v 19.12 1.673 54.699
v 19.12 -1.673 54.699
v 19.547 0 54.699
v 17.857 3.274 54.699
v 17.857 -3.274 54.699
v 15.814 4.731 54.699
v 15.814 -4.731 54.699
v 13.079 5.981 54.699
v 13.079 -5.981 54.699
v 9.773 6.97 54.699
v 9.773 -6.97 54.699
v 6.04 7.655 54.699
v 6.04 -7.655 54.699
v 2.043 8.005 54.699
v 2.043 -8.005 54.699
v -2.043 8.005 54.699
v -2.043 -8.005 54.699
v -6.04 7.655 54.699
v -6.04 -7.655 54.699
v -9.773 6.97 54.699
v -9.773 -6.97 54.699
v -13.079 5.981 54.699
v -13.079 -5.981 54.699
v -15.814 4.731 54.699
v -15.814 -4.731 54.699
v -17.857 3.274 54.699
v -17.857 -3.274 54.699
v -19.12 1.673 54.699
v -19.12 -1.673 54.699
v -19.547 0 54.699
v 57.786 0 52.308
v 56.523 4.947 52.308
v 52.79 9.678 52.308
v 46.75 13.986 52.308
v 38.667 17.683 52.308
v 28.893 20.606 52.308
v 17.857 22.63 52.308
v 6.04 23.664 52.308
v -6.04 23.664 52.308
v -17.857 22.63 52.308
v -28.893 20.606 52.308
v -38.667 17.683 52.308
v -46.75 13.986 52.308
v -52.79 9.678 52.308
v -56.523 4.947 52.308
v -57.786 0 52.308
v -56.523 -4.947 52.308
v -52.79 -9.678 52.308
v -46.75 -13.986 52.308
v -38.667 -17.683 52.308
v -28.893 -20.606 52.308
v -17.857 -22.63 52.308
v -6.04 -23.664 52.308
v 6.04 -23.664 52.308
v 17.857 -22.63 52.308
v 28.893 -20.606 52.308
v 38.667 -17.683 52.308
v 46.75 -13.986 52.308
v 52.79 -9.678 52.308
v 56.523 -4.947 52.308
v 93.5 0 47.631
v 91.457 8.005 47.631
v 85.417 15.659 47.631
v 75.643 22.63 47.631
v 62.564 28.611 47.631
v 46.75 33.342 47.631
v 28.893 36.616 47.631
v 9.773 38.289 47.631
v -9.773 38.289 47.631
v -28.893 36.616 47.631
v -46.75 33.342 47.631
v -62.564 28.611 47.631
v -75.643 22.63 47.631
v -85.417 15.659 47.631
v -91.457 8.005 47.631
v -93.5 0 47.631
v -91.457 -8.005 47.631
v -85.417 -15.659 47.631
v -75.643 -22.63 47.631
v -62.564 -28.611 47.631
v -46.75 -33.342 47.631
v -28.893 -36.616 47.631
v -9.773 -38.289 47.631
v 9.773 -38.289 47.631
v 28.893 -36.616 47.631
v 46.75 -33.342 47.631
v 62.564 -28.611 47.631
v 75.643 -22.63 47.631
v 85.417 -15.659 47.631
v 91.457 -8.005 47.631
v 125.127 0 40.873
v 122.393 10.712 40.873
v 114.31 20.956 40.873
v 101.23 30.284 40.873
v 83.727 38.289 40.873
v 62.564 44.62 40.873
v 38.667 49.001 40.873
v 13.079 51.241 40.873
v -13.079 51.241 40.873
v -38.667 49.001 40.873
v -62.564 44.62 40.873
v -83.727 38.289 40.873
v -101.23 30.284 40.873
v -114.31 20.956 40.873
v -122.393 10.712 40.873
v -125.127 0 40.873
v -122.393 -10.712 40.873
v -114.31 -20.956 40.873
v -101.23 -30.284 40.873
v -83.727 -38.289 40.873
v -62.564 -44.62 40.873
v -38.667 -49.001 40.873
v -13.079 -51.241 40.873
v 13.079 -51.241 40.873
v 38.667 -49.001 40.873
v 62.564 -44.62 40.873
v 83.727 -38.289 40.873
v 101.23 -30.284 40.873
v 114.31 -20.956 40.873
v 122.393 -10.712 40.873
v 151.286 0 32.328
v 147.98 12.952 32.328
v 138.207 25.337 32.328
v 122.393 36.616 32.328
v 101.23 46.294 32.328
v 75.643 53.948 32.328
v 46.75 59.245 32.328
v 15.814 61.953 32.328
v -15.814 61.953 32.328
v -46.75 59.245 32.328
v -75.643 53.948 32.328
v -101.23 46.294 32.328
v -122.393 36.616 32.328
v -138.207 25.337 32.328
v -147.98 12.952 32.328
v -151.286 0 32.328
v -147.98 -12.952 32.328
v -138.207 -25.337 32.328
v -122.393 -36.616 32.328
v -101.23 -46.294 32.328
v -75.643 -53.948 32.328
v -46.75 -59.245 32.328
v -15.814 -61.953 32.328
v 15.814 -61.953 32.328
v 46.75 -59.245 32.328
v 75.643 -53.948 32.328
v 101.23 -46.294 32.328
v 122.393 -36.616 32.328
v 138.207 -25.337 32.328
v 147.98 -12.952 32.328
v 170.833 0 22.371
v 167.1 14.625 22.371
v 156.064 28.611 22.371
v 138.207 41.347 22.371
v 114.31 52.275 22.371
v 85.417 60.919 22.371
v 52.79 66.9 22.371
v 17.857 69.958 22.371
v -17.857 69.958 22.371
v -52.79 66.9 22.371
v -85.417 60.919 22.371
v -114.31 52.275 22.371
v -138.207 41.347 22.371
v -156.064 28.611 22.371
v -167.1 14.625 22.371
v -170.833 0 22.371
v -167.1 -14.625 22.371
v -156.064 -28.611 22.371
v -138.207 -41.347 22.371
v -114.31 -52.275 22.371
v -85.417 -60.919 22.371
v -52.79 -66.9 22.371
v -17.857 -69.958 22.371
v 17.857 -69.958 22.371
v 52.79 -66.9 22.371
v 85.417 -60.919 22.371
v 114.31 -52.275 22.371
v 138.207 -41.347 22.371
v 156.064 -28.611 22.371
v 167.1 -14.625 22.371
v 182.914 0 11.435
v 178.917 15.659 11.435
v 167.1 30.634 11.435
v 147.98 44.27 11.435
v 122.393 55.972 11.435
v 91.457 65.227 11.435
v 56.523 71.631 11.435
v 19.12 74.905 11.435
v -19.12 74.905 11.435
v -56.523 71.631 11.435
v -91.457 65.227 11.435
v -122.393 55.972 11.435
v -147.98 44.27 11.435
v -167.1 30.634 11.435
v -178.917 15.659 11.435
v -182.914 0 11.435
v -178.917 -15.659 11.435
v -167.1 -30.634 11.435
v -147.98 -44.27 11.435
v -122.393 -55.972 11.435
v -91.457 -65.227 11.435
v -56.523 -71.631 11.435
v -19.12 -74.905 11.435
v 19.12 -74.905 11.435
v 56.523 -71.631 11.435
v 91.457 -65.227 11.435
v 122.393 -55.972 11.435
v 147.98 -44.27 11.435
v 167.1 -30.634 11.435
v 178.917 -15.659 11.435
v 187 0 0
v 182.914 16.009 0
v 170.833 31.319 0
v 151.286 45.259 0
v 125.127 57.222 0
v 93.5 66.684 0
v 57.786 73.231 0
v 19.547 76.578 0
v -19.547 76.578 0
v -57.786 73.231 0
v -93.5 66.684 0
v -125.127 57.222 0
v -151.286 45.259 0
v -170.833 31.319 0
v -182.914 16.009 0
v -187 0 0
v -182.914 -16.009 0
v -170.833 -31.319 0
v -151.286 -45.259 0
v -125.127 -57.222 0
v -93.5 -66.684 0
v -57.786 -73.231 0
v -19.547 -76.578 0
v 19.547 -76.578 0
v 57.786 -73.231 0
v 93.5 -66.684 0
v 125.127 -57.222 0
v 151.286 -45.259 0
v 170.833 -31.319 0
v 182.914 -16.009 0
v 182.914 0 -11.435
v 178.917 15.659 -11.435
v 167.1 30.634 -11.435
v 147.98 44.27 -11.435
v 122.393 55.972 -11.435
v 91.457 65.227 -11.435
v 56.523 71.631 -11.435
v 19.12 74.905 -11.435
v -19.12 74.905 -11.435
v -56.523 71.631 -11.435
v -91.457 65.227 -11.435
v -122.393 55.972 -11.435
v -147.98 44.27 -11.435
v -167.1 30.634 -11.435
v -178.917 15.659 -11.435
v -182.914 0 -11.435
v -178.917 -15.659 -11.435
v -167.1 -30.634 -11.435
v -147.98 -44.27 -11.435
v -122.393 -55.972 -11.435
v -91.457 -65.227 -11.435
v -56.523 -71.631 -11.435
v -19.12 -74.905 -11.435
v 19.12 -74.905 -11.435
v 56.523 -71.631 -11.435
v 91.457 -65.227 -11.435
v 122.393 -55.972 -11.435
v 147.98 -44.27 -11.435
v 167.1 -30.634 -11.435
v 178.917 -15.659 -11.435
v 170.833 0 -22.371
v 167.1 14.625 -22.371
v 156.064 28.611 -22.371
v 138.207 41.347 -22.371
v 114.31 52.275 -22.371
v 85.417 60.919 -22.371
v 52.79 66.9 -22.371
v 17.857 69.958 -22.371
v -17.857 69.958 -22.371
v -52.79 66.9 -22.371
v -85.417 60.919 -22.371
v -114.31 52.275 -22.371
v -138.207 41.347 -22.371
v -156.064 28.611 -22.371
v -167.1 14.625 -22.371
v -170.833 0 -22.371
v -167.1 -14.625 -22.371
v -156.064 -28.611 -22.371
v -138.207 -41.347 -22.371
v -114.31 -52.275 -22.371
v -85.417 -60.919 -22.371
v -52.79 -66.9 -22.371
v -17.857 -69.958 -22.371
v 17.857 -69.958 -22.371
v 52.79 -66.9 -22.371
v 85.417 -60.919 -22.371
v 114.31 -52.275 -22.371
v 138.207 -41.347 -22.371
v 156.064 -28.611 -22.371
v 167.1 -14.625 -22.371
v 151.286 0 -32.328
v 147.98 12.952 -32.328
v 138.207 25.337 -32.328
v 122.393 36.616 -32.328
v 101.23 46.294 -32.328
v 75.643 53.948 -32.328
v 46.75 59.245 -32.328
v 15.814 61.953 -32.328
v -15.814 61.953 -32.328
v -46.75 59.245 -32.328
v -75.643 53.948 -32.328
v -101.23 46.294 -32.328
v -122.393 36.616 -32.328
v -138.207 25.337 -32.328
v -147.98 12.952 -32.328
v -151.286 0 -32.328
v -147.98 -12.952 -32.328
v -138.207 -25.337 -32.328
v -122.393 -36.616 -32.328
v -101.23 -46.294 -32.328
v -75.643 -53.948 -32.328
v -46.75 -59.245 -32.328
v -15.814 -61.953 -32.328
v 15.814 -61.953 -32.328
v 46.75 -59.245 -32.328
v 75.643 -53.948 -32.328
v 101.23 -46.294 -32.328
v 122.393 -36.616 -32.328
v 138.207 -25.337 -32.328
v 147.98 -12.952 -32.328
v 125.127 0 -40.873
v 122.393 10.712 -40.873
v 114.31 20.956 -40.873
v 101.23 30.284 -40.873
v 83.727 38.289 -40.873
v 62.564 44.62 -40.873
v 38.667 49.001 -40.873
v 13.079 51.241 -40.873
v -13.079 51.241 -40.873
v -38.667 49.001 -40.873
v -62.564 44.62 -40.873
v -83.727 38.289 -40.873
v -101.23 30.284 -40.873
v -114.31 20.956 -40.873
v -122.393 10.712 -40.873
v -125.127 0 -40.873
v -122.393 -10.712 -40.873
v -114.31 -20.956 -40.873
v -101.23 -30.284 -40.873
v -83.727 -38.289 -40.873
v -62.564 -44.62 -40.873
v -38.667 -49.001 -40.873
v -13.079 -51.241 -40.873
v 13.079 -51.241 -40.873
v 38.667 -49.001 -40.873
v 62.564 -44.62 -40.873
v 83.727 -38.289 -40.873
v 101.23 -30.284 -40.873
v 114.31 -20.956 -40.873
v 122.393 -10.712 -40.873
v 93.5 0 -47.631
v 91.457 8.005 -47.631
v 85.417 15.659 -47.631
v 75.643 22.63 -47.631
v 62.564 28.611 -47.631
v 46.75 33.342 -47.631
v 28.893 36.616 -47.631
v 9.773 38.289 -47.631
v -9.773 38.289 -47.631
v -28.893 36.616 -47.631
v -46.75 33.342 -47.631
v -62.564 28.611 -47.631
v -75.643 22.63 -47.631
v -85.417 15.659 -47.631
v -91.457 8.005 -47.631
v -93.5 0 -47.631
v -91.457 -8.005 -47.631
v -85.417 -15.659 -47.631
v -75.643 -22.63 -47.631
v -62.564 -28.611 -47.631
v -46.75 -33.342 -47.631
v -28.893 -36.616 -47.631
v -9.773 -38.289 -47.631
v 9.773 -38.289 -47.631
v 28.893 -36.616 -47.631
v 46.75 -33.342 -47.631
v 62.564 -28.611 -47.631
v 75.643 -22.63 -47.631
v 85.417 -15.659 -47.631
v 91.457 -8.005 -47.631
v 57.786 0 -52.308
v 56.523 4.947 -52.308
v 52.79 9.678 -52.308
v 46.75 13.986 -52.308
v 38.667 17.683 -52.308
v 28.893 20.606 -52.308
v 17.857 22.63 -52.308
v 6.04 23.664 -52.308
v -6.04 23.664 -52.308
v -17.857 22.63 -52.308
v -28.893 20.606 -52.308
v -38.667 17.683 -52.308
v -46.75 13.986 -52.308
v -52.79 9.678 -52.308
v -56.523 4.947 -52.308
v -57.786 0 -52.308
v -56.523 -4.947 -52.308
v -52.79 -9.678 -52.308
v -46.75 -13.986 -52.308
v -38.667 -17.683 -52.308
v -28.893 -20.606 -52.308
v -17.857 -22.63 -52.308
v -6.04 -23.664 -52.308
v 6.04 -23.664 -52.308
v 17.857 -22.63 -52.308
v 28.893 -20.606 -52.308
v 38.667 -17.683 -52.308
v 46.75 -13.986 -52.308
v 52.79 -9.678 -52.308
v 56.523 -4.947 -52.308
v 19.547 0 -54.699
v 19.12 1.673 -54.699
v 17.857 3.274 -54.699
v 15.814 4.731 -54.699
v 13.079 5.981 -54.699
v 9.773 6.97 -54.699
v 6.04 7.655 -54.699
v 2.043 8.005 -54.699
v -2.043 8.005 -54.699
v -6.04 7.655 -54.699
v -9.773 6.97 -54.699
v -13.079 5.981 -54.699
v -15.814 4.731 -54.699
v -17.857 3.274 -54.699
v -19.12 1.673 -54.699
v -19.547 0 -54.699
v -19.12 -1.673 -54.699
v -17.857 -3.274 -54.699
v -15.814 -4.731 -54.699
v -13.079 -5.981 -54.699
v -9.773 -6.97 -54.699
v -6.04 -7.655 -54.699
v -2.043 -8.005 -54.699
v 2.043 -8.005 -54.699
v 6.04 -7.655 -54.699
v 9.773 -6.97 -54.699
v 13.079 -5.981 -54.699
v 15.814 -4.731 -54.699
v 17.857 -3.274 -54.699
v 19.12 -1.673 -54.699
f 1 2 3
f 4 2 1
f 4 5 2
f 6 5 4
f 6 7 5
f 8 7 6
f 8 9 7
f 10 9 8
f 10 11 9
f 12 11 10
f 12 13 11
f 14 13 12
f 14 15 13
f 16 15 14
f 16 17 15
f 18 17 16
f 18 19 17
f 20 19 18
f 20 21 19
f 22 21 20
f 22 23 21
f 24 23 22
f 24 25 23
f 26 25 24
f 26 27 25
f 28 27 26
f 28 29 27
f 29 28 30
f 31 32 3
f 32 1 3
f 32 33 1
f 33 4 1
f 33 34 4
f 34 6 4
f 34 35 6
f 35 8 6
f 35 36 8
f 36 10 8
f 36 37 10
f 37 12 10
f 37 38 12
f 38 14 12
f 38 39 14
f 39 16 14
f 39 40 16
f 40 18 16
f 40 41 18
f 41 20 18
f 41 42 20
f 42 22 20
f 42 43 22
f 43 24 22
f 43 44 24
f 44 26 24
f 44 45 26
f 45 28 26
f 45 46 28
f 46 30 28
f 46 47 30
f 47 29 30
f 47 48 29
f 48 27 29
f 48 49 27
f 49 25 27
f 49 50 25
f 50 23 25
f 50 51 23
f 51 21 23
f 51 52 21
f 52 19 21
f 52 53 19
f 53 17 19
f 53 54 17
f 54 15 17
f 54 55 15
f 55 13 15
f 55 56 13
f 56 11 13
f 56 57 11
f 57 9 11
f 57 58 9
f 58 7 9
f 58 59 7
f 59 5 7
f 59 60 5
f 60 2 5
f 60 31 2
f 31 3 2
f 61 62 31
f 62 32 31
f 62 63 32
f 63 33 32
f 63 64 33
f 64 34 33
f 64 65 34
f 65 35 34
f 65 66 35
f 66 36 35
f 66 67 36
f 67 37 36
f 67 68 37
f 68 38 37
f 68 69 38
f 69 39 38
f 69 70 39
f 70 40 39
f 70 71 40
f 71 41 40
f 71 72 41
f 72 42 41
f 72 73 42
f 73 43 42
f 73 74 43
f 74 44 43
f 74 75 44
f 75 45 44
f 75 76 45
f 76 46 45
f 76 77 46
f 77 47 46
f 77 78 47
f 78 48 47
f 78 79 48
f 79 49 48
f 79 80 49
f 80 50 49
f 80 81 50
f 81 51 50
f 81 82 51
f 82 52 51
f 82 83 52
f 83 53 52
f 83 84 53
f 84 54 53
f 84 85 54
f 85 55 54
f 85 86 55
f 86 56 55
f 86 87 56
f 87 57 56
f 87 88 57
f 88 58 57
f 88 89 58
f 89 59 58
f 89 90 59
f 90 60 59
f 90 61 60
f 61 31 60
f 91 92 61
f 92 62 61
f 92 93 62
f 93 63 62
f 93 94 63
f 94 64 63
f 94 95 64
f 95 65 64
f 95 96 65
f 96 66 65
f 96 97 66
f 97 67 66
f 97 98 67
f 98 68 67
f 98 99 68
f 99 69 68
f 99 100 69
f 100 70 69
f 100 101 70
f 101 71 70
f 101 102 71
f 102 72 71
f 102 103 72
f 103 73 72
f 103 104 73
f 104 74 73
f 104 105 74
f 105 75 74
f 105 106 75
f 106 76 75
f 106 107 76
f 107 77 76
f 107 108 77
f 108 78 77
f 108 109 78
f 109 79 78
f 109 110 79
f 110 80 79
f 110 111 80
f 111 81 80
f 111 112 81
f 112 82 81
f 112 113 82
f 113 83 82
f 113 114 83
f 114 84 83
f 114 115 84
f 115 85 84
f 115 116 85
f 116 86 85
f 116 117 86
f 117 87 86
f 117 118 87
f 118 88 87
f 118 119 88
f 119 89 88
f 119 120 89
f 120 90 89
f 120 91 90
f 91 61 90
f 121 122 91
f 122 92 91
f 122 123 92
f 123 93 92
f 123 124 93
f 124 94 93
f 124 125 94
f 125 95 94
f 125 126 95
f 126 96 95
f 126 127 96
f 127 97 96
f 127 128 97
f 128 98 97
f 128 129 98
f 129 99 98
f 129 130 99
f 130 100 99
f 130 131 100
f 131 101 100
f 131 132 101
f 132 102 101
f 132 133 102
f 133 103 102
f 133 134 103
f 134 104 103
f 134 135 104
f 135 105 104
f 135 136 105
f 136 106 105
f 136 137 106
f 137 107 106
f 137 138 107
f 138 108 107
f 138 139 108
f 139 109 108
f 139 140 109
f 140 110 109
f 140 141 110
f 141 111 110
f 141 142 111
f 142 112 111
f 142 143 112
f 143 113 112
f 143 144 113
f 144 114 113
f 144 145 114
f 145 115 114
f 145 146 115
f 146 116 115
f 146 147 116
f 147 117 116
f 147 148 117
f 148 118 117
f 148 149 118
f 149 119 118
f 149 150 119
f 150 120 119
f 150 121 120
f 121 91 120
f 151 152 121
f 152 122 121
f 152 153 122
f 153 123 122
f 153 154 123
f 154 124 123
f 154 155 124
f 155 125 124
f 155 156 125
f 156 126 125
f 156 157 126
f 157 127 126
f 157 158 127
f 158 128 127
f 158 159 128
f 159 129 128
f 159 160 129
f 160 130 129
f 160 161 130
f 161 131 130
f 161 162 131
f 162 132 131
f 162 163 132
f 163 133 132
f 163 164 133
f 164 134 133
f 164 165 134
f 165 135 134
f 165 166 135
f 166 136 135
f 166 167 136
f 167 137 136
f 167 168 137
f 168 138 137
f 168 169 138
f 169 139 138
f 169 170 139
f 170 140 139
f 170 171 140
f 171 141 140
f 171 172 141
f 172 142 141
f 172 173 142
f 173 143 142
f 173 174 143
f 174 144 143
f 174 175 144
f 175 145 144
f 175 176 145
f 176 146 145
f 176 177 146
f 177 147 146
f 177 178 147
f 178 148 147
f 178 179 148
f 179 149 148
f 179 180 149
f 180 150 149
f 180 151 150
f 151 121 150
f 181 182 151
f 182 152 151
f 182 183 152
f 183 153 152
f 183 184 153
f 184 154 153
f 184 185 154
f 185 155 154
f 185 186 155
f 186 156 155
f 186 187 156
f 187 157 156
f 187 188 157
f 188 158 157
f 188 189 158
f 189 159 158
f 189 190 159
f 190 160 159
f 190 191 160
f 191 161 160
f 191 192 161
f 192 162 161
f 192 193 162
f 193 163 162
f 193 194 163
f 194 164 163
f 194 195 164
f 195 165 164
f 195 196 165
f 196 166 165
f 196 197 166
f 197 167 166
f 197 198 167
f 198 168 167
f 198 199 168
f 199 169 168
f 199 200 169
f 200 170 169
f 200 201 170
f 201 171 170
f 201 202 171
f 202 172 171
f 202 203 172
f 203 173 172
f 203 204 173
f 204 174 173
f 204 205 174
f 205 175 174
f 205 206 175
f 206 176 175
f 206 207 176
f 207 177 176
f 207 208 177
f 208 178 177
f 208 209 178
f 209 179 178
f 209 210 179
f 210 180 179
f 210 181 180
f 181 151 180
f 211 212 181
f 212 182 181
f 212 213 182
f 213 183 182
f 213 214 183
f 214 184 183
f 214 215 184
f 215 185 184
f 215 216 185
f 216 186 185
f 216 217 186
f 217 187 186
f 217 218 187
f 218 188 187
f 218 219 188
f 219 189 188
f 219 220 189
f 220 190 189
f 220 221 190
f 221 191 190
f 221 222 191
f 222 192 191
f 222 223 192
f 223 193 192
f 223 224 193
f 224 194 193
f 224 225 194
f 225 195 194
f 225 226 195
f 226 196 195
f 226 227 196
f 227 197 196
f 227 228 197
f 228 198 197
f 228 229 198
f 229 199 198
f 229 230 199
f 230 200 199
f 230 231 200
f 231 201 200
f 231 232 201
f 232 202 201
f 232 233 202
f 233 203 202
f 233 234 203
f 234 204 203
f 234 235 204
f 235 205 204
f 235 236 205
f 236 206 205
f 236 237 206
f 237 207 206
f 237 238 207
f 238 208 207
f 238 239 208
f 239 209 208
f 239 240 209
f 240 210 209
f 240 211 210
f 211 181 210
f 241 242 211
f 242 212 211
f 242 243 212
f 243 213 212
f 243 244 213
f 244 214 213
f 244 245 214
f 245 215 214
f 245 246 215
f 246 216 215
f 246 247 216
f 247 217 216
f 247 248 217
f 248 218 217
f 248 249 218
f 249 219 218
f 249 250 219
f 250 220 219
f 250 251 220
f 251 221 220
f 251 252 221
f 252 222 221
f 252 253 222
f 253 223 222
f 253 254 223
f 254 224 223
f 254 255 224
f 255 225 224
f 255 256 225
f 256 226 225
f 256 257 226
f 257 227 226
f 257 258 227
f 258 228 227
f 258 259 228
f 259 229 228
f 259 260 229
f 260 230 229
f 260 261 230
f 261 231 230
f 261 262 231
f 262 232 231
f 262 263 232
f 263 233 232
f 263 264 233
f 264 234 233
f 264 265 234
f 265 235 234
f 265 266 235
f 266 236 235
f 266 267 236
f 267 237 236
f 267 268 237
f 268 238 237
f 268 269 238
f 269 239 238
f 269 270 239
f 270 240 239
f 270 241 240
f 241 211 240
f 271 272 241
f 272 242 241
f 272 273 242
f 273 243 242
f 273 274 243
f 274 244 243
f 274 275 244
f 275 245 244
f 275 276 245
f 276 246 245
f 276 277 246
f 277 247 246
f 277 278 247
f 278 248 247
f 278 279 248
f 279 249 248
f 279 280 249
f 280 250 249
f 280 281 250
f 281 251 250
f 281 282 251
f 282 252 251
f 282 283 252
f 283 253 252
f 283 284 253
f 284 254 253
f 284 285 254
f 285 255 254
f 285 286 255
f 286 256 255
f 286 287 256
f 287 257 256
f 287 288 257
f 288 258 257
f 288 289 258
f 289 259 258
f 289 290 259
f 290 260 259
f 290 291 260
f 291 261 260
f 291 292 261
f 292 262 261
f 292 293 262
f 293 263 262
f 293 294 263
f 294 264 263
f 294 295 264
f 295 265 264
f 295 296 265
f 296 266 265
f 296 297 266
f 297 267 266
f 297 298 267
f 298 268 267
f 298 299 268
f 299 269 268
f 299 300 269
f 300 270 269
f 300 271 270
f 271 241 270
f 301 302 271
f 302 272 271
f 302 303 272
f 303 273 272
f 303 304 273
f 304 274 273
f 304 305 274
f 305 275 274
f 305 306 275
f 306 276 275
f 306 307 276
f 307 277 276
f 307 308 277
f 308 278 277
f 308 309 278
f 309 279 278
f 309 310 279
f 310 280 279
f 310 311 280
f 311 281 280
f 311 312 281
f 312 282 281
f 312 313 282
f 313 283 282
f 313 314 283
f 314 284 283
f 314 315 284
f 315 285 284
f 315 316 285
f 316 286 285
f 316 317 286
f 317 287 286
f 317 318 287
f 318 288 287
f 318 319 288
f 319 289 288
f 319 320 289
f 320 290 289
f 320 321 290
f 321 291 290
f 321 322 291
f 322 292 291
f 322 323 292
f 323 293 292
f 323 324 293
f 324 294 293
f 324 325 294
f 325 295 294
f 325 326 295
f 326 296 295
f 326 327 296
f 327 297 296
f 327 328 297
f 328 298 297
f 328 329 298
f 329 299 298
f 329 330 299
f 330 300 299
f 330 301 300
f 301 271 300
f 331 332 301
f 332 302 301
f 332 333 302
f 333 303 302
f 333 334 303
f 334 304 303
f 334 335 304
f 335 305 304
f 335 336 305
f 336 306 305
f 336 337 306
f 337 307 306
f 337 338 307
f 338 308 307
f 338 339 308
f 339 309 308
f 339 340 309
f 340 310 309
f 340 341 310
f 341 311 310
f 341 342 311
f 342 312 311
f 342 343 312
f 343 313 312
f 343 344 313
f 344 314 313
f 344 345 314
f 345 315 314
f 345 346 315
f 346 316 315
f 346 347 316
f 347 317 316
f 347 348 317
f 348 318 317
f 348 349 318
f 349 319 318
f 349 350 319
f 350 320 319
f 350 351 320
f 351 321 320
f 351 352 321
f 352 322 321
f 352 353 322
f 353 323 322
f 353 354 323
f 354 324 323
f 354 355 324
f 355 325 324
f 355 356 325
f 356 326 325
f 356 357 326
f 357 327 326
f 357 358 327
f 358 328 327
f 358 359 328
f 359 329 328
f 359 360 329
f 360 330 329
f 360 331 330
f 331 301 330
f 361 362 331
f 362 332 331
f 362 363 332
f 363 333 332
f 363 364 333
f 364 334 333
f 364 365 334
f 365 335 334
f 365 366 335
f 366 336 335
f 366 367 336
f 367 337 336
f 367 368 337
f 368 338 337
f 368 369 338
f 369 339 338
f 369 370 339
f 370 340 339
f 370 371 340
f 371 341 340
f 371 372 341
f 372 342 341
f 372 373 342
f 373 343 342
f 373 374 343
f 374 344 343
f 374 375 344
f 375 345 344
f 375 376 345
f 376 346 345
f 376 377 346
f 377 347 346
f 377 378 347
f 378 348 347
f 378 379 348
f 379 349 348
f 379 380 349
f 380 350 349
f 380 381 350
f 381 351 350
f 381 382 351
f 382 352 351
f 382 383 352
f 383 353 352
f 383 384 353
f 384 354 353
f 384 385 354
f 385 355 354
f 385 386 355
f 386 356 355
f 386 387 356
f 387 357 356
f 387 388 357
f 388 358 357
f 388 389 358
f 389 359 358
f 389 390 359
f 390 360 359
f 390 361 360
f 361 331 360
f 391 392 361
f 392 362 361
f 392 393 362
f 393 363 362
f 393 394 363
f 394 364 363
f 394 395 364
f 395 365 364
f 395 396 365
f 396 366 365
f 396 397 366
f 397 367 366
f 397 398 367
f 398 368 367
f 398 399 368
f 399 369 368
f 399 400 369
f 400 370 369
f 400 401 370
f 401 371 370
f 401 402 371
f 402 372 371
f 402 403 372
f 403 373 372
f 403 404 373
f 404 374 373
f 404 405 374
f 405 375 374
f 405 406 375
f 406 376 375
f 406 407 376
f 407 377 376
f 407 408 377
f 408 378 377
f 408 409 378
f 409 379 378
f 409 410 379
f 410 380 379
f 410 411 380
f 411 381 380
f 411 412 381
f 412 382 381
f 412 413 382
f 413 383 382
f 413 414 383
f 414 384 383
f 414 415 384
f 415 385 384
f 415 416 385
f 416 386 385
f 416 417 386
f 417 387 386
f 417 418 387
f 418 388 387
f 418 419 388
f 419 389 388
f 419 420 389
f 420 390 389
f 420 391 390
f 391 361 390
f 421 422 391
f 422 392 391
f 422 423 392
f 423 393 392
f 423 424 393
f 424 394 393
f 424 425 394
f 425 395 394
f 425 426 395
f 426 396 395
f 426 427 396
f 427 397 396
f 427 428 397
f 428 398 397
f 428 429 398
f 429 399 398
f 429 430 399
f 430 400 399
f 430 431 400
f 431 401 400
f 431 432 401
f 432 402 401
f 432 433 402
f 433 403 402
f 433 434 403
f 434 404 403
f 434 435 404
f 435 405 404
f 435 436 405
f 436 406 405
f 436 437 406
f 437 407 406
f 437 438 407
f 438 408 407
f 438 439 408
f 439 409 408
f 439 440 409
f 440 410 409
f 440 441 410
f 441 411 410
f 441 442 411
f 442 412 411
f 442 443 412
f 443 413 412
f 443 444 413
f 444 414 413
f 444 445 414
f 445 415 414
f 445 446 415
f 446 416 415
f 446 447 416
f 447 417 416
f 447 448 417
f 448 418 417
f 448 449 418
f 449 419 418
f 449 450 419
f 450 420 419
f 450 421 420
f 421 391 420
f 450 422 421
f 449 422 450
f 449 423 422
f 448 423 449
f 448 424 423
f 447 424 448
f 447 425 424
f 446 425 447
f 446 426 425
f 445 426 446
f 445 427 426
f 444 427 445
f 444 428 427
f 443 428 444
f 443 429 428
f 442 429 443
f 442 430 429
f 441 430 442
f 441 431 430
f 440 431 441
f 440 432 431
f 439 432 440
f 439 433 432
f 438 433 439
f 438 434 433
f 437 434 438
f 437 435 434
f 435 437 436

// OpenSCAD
// Generated by SolidPython 1.0.1 on 2020-07-29 00:46:52


scale(v = [17, 7, 5]) {
	sphere(r = 11);
}
/***********************************************
*********      SolidPython code:      **********
************************************************
 
# import packages: SolidPython
from solid import *
from solid.utils import *
from itertools import chain, combinations, permutations


class Resize:

    def __init__(self, scad_file):
        self.scad_file = scad_file
        #self.scad_file = import_scad(scad_file)
        # cone/cylinder param:
        self.r1 = 0
        self.r2 = 0
        self.h = 0
        # rectangular prism param:
        self.w = 0
        self.l = 0
        # ellipse param:
        self.r = 0

    # import OpenScad code (file name corresponds to shape)


    # classify shape + parameters
    def assign(self, param1, param2, param3):
        if self.scad_file == 'cone.scad':
            self.r1 = param1
            self.r2 = param2
            self.h = param3
        elif self.scad_file == 'cylinder.scad':
            self.r1 = param1
            self.r2 = param2
            self.h = param3
        elif self.scad_file == 'rectangularPrism.scad':
            self.h = param1
            self.l = param2
            self.w = param3
        else:
            self.r = param1
            self.h = param2

    # resize parameters
    def iterate(self):
        x = range(3, 20, 2)
        i = 1
        if self.scad_file == 'cone.scad':
            tempList = list(permutations(x, 2))
            for temp in tempList:
                param1 = temp[0]
                param2 = temp[1]
                filepath = 'produced_scad_files/' + 'cone' + str(param1) + '_' + str(param2) + '_' + '.scad'
                scad_render_to_file(cylinder(h=param1, r1=param2, r2=0), filepath)

        elif self.scad_file == 'cylinder.scad':
            tempList = list(permutations(x, 3))
            for temp in tempList:
                param1 = temp[0]
                param2 = temp[1]
                filepath = 'produced_scad_files/' + 'cylinder' + str(param1) + '_' + str(param2) + '_' + '.scad'
                scad_render_to_file(cylinder(h=param1, r1=param2, r2=param2), filepath)

        elif self.scad_file == 'rectangularPrism.scad':
            tempList = list(permutations(x, 3))
            for temp in tempList:
                param1 = temp[0]
                param2 = temp[1]
                param3 = temp[2]
                filepath = 'produced_scad_files/' + 'rectangularPrism' + str(param1) + '_' + str(param2) + '_' + str(
                    param3) + '.scad'
                scad_render_to_file(cube(size=(param1, param2, param3)), filepath)

        elif self.scad_file == 'ellipse.scad':
            tempList = list(permutations(x, 4))
            for temp in tempList:
                param1 = temp[0]
                param2 = temp[1]
                param3 = temp[2]
                param4 = temp[3]
                filepath = 'produced_scad_files/' + 'ellipse' + str(param1) + '_' + str(param2) + '_' + str(param3) + '_' + str(param4) + '.scad'
                scad_render_to_file(scale([param1, param2, param3])(sphere(r=param4)), filepath)

    def render_to_scadfile(self):
        scad_render_to_file(scad, 'example.scad') 
 
************************************************/
